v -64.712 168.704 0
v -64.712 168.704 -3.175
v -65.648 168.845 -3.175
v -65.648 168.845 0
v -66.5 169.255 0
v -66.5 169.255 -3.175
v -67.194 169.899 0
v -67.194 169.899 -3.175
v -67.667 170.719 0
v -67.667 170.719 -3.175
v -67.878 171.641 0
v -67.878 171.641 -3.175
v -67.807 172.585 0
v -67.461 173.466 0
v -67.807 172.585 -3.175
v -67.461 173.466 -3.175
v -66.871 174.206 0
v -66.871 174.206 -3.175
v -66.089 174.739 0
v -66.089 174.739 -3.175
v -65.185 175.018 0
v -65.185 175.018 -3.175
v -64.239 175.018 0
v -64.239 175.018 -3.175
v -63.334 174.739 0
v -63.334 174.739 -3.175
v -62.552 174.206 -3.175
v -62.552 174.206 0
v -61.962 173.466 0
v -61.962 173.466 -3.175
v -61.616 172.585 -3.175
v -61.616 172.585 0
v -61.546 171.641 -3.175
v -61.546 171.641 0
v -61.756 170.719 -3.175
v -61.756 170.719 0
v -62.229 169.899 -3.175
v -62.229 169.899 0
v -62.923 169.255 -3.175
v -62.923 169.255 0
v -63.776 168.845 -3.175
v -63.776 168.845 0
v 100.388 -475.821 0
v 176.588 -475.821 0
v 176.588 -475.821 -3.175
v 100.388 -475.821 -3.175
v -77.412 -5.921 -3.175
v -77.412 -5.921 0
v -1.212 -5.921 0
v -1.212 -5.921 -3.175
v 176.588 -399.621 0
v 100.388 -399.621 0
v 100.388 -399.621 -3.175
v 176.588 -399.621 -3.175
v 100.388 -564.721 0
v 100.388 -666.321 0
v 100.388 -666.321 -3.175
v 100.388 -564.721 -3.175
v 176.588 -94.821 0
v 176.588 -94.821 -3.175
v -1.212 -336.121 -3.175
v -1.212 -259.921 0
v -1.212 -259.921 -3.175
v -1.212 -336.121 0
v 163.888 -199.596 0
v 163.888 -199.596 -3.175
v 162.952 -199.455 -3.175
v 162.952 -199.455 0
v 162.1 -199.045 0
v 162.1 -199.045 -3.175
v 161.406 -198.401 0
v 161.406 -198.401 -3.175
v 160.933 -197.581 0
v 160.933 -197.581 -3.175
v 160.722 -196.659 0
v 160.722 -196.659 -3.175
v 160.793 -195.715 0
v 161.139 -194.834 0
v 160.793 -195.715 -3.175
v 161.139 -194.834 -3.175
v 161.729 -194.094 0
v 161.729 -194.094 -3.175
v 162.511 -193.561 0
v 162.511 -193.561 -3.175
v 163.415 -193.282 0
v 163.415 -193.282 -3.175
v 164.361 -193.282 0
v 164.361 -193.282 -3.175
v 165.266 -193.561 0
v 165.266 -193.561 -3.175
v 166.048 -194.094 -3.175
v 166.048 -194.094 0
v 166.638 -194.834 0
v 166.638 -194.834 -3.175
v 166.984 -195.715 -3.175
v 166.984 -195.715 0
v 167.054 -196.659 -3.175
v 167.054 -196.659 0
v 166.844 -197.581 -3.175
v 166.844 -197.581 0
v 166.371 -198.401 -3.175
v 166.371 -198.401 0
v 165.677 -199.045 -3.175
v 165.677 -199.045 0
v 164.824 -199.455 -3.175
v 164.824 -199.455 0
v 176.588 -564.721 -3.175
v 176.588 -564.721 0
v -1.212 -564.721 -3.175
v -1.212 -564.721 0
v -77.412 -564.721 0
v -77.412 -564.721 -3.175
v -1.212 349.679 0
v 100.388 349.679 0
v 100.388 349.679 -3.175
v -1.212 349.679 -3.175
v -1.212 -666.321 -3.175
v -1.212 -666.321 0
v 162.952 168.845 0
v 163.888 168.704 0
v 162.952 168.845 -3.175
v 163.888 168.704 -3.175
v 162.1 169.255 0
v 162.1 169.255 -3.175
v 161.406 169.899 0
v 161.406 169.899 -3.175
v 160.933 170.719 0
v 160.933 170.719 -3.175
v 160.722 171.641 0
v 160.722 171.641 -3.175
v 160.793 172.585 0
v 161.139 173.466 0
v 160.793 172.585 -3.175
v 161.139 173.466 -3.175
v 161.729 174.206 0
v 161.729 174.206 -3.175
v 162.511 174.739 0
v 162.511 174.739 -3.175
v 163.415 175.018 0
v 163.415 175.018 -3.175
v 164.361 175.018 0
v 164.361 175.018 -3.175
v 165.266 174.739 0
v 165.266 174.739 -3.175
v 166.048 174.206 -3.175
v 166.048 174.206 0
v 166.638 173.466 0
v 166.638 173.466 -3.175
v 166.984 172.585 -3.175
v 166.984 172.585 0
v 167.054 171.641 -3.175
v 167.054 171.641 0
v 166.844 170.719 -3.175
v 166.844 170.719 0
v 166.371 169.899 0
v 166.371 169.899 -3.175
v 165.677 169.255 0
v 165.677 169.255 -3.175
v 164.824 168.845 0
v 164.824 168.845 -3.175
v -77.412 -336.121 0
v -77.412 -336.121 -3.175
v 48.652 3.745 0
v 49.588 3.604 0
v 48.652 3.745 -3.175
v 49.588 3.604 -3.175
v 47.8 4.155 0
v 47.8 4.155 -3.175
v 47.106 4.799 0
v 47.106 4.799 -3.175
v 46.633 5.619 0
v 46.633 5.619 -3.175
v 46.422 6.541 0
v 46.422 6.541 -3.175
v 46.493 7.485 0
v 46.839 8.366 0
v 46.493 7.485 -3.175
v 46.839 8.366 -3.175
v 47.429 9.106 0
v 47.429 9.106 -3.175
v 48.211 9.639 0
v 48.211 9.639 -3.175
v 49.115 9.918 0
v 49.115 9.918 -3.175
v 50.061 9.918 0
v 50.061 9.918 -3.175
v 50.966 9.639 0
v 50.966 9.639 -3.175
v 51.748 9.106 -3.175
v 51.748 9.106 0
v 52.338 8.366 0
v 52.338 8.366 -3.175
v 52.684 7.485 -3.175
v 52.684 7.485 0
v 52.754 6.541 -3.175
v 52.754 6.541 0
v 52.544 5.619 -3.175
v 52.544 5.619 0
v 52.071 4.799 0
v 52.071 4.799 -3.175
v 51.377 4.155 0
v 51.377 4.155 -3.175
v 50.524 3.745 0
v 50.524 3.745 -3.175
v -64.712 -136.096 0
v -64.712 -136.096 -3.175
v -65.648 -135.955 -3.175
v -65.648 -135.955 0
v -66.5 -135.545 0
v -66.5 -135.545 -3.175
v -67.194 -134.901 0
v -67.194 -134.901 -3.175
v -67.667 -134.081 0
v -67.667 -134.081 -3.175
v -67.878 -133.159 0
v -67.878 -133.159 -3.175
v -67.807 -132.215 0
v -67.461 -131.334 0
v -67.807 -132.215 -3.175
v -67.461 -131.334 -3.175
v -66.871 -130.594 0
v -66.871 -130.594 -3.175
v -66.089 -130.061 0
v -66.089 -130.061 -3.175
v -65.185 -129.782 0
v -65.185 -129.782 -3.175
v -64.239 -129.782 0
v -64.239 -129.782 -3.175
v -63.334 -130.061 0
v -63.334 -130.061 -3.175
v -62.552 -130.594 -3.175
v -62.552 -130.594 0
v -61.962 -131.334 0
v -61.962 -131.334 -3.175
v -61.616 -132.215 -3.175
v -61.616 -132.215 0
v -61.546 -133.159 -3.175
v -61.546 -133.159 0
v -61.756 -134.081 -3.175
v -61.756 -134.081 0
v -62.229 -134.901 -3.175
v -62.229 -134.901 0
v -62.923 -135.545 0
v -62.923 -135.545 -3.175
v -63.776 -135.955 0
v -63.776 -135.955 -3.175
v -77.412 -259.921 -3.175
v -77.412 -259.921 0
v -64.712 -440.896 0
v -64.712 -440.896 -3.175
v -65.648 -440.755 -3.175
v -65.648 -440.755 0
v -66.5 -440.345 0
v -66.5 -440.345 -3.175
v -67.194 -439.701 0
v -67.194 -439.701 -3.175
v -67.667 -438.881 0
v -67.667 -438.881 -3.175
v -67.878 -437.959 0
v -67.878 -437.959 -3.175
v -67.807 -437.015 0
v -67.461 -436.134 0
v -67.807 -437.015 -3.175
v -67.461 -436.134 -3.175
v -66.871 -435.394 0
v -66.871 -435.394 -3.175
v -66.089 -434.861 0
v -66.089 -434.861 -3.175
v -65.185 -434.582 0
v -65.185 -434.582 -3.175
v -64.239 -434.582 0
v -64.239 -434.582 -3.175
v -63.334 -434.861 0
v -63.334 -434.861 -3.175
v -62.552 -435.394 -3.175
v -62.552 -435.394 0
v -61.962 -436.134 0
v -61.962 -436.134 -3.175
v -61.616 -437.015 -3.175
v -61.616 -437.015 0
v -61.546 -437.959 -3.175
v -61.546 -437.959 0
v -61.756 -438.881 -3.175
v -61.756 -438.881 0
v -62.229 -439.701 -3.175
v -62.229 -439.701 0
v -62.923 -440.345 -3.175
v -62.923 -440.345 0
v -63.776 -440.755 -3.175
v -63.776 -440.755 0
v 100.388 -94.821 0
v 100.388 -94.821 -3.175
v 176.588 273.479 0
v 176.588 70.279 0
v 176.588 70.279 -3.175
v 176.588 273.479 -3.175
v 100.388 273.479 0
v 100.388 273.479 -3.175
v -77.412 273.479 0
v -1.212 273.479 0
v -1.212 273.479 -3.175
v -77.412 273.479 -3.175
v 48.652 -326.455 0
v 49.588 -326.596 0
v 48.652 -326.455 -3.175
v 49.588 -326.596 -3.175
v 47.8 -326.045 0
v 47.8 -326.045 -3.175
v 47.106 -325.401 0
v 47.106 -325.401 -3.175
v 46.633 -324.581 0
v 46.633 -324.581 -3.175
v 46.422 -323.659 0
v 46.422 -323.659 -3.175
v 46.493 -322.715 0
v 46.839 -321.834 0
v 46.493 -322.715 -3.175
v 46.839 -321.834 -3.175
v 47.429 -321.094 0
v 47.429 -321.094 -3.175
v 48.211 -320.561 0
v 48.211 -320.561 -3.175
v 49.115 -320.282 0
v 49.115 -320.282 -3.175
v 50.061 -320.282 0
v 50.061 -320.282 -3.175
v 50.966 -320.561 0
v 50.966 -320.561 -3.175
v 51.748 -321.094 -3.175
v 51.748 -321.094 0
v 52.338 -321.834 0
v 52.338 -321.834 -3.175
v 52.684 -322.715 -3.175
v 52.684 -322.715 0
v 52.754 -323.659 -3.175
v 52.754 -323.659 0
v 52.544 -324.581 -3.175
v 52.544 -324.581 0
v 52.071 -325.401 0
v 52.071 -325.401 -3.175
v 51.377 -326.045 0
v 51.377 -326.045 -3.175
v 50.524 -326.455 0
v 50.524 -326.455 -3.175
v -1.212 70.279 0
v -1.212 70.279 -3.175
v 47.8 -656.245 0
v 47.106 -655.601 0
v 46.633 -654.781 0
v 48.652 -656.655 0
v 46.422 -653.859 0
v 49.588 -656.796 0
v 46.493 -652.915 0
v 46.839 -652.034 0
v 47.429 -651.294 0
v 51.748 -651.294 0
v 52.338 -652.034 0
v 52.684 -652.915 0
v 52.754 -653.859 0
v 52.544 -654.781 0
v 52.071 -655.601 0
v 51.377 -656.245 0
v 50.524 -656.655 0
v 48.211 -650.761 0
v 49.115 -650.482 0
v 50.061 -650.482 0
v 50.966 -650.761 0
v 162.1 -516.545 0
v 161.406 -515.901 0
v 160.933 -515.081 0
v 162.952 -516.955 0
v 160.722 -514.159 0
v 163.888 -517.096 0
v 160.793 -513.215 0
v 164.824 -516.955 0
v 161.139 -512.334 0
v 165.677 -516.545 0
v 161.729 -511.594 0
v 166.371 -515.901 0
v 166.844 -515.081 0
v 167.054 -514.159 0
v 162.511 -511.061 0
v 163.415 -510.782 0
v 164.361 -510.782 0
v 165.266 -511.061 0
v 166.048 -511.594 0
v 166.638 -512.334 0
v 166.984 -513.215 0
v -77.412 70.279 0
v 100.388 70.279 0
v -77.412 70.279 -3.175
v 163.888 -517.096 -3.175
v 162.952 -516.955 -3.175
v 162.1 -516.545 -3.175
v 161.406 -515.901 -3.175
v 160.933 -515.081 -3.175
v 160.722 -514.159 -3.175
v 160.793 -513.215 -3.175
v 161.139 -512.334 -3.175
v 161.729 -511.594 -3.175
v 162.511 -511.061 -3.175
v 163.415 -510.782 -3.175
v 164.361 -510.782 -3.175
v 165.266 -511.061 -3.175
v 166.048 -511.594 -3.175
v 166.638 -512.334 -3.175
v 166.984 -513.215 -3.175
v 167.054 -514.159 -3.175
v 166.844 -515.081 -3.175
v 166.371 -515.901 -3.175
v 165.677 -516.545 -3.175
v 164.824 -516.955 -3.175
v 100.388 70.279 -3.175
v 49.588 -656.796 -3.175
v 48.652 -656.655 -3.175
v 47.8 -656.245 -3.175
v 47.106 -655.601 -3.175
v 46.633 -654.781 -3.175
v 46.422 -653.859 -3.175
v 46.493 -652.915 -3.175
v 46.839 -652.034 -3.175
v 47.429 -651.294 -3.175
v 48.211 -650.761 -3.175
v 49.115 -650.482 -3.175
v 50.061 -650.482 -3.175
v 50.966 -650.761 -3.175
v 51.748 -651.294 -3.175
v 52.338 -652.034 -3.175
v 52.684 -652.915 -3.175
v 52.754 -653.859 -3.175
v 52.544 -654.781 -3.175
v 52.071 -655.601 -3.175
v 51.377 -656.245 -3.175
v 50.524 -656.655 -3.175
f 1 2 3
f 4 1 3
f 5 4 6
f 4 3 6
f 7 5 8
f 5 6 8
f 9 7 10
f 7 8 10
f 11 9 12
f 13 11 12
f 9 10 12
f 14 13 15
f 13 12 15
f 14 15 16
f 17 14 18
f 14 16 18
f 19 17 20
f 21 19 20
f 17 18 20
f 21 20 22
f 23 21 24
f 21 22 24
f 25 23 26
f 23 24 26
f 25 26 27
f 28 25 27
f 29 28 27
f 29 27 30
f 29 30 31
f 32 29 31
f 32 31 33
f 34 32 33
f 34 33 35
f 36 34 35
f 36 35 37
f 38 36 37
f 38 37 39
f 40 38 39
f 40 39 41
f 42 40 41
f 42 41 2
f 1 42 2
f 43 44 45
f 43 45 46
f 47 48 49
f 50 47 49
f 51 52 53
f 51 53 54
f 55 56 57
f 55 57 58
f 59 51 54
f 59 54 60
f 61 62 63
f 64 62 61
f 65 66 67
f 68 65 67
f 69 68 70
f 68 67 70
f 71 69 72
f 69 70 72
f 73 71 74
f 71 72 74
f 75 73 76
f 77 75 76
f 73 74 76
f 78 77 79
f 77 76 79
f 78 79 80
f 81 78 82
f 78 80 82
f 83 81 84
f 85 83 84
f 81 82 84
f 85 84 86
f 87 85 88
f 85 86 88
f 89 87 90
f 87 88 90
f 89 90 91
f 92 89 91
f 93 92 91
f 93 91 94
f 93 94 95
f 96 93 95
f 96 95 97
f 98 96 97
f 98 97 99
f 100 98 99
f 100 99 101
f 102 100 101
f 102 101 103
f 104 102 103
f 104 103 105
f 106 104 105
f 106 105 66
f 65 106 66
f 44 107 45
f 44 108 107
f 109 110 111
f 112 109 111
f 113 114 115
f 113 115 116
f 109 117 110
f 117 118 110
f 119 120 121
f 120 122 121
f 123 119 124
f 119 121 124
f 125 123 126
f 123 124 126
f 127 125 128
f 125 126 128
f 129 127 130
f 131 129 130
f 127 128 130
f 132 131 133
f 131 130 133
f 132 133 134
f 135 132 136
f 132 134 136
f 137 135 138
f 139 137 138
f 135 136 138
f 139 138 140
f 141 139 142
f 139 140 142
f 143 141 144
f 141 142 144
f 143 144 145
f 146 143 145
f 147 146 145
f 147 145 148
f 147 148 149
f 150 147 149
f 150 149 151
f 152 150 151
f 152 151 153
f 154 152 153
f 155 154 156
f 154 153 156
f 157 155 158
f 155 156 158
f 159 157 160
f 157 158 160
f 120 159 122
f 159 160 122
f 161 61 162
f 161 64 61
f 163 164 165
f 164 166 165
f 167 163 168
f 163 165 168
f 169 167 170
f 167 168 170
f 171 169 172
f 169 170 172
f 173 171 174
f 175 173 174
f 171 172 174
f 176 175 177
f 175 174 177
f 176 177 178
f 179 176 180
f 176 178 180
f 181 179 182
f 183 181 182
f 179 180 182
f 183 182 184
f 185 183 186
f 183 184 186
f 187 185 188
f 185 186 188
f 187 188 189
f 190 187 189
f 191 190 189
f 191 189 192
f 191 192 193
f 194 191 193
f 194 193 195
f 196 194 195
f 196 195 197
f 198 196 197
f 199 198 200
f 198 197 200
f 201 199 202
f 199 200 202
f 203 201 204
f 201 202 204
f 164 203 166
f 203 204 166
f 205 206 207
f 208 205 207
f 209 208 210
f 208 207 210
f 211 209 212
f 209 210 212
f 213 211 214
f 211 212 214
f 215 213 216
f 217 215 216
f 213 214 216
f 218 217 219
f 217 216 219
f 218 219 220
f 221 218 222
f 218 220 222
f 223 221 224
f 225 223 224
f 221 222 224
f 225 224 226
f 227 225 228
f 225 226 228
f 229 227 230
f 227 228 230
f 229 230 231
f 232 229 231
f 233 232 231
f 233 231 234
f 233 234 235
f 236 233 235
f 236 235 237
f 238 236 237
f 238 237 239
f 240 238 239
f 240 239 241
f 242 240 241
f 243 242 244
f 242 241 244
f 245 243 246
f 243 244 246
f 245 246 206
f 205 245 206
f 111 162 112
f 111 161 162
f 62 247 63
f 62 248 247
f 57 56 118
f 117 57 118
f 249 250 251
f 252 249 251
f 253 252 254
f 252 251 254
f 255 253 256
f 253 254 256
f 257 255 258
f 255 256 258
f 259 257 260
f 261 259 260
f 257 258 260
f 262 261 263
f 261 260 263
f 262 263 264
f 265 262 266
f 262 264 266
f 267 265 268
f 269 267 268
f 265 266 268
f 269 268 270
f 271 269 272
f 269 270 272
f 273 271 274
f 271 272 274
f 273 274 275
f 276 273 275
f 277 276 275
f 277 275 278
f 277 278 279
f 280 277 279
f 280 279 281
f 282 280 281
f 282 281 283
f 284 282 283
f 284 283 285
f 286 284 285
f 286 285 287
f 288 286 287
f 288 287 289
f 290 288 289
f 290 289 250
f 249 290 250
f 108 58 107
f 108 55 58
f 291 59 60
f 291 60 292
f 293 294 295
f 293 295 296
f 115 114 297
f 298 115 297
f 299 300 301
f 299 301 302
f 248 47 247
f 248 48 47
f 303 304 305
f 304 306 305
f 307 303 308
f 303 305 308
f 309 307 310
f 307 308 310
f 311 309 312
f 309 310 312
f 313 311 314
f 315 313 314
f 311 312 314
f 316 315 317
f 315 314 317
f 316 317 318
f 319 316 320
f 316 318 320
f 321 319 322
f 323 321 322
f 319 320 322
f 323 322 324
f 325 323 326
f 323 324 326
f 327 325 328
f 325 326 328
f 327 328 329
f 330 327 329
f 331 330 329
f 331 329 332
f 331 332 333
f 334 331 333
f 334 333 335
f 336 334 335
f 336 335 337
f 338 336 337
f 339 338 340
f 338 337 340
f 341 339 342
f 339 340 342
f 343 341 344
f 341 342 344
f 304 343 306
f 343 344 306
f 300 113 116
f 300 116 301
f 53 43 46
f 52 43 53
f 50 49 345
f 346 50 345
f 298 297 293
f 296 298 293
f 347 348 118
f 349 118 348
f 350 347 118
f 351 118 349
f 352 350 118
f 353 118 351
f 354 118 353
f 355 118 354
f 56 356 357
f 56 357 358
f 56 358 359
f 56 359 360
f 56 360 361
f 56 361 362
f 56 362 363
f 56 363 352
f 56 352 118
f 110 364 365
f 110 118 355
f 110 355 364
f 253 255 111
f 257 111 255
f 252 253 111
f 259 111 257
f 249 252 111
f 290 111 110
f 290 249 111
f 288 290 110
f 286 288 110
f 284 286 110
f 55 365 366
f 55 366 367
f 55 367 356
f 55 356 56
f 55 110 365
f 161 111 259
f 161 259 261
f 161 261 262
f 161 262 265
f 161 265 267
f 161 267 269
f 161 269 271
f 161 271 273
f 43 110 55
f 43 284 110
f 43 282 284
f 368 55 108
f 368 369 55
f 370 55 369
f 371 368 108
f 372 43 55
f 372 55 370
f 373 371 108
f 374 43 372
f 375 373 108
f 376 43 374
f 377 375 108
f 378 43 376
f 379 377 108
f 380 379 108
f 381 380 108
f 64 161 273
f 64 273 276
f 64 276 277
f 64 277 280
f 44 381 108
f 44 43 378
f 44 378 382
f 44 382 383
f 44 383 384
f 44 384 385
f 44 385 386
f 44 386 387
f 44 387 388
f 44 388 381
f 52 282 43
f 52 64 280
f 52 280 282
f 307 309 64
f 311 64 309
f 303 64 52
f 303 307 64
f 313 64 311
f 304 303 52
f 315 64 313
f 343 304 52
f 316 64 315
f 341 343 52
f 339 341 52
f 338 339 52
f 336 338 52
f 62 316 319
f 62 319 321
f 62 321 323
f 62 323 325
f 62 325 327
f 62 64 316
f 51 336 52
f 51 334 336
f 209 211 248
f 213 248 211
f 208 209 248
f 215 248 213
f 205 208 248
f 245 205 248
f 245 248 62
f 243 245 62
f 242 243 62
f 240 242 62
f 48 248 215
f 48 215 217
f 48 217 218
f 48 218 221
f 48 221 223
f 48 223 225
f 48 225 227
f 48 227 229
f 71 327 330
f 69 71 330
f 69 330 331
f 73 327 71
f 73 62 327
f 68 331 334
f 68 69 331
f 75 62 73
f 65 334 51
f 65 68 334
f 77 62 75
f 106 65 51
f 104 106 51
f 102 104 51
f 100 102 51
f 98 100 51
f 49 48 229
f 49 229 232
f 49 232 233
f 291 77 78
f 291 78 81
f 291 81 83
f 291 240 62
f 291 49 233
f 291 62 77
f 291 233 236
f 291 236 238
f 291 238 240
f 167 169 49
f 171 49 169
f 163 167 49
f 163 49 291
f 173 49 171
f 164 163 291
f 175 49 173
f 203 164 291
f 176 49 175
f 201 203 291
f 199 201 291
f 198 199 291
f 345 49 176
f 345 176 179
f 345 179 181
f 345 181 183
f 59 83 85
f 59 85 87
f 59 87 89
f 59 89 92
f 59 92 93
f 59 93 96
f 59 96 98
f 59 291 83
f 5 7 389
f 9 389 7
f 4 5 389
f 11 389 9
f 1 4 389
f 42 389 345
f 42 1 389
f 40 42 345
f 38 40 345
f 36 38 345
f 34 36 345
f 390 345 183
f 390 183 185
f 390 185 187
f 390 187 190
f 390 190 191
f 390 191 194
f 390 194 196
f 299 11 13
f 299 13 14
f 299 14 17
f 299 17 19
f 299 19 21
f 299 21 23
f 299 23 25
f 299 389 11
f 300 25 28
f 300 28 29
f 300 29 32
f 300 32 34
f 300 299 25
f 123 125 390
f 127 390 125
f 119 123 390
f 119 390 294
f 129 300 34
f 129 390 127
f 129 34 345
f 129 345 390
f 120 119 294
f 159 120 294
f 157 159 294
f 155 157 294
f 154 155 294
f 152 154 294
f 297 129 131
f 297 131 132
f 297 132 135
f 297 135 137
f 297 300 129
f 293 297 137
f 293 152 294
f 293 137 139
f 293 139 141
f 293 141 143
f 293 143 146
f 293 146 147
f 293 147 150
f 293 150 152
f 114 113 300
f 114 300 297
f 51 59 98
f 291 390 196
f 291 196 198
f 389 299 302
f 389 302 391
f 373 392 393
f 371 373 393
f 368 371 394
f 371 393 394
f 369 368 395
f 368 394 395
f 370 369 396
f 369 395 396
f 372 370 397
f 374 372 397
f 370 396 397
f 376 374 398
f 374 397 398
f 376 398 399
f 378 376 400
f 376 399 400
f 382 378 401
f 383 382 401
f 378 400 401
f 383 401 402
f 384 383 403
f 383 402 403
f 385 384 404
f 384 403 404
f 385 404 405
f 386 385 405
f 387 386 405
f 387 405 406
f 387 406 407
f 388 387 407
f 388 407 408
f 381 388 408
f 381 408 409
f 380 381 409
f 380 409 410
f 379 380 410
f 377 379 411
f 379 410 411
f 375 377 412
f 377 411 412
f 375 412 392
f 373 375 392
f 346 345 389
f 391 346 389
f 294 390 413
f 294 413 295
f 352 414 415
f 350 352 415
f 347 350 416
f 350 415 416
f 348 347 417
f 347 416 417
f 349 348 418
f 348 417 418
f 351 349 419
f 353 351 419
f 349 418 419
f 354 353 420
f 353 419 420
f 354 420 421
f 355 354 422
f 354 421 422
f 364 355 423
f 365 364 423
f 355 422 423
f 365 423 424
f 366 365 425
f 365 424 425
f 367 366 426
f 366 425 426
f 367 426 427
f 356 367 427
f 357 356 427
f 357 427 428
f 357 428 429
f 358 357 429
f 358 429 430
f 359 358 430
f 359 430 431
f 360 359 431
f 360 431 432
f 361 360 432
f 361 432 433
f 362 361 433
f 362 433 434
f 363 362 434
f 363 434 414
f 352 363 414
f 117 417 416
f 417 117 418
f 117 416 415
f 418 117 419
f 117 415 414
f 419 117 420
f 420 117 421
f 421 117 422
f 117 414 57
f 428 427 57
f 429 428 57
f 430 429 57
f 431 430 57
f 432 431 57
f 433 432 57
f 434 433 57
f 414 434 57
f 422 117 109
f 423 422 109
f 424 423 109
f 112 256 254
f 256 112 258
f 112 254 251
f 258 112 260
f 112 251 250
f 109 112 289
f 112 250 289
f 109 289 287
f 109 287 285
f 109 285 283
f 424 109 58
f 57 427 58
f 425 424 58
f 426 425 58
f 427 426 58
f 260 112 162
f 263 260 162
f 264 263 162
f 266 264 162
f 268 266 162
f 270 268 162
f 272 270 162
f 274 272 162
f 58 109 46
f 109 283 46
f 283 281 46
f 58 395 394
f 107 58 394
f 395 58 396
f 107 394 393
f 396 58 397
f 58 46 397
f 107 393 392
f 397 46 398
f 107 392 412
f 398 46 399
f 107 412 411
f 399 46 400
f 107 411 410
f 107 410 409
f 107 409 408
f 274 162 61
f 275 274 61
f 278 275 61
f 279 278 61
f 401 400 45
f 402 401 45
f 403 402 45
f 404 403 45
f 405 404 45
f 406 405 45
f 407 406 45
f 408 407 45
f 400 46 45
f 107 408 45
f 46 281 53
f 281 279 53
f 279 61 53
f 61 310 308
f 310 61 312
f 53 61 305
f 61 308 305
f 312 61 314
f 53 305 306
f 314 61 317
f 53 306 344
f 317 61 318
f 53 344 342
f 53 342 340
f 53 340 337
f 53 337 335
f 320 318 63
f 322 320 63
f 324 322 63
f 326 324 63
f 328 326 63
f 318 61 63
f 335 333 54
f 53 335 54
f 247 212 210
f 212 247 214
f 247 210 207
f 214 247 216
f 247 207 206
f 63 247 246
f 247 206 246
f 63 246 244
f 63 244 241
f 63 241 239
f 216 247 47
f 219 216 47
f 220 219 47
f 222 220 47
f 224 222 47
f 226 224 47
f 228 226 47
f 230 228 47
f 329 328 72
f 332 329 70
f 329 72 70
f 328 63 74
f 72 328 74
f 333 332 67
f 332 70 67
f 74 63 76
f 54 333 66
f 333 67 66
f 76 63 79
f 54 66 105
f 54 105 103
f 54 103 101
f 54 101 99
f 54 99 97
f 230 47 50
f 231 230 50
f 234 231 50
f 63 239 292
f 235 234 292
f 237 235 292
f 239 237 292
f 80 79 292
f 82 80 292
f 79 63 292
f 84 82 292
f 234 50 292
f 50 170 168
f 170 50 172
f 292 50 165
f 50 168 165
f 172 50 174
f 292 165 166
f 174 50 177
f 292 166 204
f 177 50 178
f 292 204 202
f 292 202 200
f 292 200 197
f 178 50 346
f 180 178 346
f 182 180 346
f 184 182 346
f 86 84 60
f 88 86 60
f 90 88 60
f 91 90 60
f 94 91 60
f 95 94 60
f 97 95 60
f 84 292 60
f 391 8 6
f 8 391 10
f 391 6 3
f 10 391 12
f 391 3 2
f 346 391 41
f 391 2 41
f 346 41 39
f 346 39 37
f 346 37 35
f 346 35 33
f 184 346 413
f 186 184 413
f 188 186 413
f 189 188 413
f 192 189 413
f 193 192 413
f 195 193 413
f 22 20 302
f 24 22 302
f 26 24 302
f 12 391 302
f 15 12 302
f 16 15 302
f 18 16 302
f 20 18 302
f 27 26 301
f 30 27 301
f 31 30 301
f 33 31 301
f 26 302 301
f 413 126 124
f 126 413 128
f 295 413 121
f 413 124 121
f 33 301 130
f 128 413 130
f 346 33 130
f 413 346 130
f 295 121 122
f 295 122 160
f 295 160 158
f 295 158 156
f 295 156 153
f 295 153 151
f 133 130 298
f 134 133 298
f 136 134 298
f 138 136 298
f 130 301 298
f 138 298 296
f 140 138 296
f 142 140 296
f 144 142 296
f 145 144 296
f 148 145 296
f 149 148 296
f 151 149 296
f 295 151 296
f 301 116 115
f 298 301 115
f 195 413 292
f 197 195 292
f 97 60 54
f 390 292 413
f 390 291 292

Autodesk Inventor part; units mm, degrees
ref_plane "YZ Plane" through (0, 0, 0) normal (1, 0, 0) x (0, 1, 0)
ref_plane "XZ Plane" through (0, 0, 0) normal (0, 1, 0) x (-1, 0, 0)
ref_plane "XY Plane" through (0, 0, 0) normal (0, 0, 1) x (1, 0, 0)
sketch "Sketch1" plane through (0, 0, 0) normal (0, 0, 1) x (1, 0, 0)
  line L0 (176.5882, -640.9214) -> (176.5882, 349.6786)
  line L1 (176.5882, 349.6786) -> (-77.4118, 349.6786)
  line L2 (-77.4118, 349.6786) -> (-77.4118, -640.9214)
  line L3 (100.3882, -640.9214) -> (100.3882, -564.7214)
  line L4 (100.3882, -564.7214) -> (176.5882, -564.7214)
  line L5 (176.5882, -475.8214) -> (100.3882, -475.8214)
  line L6 (100.3882, -475.8214) -> (100.3882, -399.6214)
  line L7 (100.3882, -399.6214) -> (176.5882, -399.6214)
  line L8 (176.5882, -399.6214) -> (176.5882, -475.8214)
  line L9 (176.5882, -94.8214) -> (100.3882, -94.8214)
  line L10 (100.3882, -94.8214) -> (100.3882, 70.2786)
  line L11 (100.3882, 70.2786) -> (176.5882, 70.2786)
  line L12 (176.5882, 70.2786) -> (176.5882, -94.8214)
  line L13 (176.5882, 349.6786) -> (100.3882, 349.6786)
  line L14 (100.3882, 349.6786) -> (100.3882, 273.4786)
  line L15 (100.3882, 273.4786) -> (176.5882, 273.4786)
  line L16 (176.5882, 273.4786) -> (176.5882, 349.6786)
  line L17 (-77.4118, 275.381) -> (-77.4118, 369.0362)
  line L18 (-77.4118, -16.7496) -> (-77.4118, 88.2844)
  line L19 (-77.4118, -379.8866) -> (-77.4118, -294.668)
  line L20 (-77.4118, -640.9214) -> (-1.2118, -640.9214)
  line L21 (-1.2118, -640.9214) -> (-1.2118, -564.7214)
  line L22 (-1.2118, -564.7214) -> (-77.4118, -564.7214)
  line L23 (-77.4118, -564.7214) -> (-77.4118, -640.9214)
  line L24 (-77.4118, -259.9214) -> (-1.2118, -259.9214)
  line L25 (-1.2118, -259.9214) -> (-1.2118, -336.1214)
  line L26 (-1.2118, -336.1214) -> (-77.4118, -336.1214)
  line L27 (-77.4118, -336.1214) -> (-77.4118, -259.9214)
  line L28 (-77.4118, -5.9214) -> (-1.2118, -5.9214)
  line L29 (-1.2118, -5.9214) -> (-1.2118, 70.2786)
  line L30 (-1.2118, 70.2786) -> (-77.4118, 70.2786)
  line L31 (-77.4118, 70.2786) -> (-77.4118, -5.9214)
  line L32 (-77.4118, 349.6786) -> (-1.2118, 349.6786)
  line L33 (-1.2118, 349.6786) -> (-1.2118, 273.4786)
  line L34 (-1.2118, 273.4786) -> (-77.4118, 273.4786)
  line L35 (-77.4118, 273.4786) -> (-77.4118, 349.6786)
  line L36 (100.3882, -640.9214) -> (100.3882, -666.3214)
  line L37 (100.3882, -666.3214) -> (-1.2118, -666.3214)
  line L38 (-1.2118, -666.3214) -> (-1.2118, -640.9214)
  point P0 (0, 0)
  point P1 (49.5882, -323.4214)
  point P2 (-64.7118, -437.7214)
  point P3 (-64.7118, -132.9214)
  point P4 (163.8882, 171.8786)
  point P5 (-64.7118, 171.8786)
  point P6 (163.8882, -196.4214)
  point P7 (163.8882, -513.9214)
  point P8 (49.5882, -653.6214)
  point P9 (49.5882, 6.7786)
  dimension "d0" = 254
  dimension "d1" = 990.6
  dimension "d2" = 76.2
  dimension "d3" = 76.2
  dimension "d4" = 76.2
  dimension "d5" = 76.2
  dimension "d6" = 88.9
  dimension "d7" = 304.8
  dimension "d8" = 203.2
  dimension "d9" = 76.2
  dimension "d10" = 76.2
  dimension "d11" = 76.2
  dimension "d14" = 76.2
  dimension "d15" = 76.2
  dimension "d16" = 76.2
  dimension "d17" = 76.2
  dimension "d18" = 63.5
  dimension "d19" = 76.2
  dimension "d20" = 76.2
  dimension "d21" = 203.2
  dimension "d22" = 76.2
  dimension "d23" = 76.2
  dimension "d24" = 12.7
  dimension "d25" = 12.7
  dimension "d26" = 101.6
  dimension "d27" = 101.6
  dimension "d28" = 127
  dimension "d29" = 12.7
  dimension "d30" = 12.7
  dimension "d31" = 127
  dimension "d32" = 101.6
  dimension "d33" = 12.7
  dimension "d34" = 12.7
  dimension "d35" = 101.6
  dimension "d36" = 38.1
  dimension "d37" = 25.4
  dimension "d38" = 101.6
  dimension "d46" = 12.7
extrude "Extrusion1" add sketch "Sketch1" against normal blind 3.175 contours L4 L3 L36 L37 L38 L21 L22 L2 L26 L25 L24 L28 L29 L30 L34 L33 L1 L14 L15 L0 L11 L10 L9 L7 L6 L5
hole "Hole1" at (49.5882, -323.4214, 0) at (-64.7118, -437.7214, 0) at (-64.7118, -132.9214, 0) at (163.8882, 171.8786, 0) at (-64.7118, 171.8786, 0) at (163.8882, -196.4214, 0) at (163.8882, -513.9214, 0) at (49.5882, -653.6214, 0) at (49.5882, 6.7786, 0) direction (0, 0, -1) diameter 6.35 depth 25.4 tip angle 118
properties part number "tower walls"
